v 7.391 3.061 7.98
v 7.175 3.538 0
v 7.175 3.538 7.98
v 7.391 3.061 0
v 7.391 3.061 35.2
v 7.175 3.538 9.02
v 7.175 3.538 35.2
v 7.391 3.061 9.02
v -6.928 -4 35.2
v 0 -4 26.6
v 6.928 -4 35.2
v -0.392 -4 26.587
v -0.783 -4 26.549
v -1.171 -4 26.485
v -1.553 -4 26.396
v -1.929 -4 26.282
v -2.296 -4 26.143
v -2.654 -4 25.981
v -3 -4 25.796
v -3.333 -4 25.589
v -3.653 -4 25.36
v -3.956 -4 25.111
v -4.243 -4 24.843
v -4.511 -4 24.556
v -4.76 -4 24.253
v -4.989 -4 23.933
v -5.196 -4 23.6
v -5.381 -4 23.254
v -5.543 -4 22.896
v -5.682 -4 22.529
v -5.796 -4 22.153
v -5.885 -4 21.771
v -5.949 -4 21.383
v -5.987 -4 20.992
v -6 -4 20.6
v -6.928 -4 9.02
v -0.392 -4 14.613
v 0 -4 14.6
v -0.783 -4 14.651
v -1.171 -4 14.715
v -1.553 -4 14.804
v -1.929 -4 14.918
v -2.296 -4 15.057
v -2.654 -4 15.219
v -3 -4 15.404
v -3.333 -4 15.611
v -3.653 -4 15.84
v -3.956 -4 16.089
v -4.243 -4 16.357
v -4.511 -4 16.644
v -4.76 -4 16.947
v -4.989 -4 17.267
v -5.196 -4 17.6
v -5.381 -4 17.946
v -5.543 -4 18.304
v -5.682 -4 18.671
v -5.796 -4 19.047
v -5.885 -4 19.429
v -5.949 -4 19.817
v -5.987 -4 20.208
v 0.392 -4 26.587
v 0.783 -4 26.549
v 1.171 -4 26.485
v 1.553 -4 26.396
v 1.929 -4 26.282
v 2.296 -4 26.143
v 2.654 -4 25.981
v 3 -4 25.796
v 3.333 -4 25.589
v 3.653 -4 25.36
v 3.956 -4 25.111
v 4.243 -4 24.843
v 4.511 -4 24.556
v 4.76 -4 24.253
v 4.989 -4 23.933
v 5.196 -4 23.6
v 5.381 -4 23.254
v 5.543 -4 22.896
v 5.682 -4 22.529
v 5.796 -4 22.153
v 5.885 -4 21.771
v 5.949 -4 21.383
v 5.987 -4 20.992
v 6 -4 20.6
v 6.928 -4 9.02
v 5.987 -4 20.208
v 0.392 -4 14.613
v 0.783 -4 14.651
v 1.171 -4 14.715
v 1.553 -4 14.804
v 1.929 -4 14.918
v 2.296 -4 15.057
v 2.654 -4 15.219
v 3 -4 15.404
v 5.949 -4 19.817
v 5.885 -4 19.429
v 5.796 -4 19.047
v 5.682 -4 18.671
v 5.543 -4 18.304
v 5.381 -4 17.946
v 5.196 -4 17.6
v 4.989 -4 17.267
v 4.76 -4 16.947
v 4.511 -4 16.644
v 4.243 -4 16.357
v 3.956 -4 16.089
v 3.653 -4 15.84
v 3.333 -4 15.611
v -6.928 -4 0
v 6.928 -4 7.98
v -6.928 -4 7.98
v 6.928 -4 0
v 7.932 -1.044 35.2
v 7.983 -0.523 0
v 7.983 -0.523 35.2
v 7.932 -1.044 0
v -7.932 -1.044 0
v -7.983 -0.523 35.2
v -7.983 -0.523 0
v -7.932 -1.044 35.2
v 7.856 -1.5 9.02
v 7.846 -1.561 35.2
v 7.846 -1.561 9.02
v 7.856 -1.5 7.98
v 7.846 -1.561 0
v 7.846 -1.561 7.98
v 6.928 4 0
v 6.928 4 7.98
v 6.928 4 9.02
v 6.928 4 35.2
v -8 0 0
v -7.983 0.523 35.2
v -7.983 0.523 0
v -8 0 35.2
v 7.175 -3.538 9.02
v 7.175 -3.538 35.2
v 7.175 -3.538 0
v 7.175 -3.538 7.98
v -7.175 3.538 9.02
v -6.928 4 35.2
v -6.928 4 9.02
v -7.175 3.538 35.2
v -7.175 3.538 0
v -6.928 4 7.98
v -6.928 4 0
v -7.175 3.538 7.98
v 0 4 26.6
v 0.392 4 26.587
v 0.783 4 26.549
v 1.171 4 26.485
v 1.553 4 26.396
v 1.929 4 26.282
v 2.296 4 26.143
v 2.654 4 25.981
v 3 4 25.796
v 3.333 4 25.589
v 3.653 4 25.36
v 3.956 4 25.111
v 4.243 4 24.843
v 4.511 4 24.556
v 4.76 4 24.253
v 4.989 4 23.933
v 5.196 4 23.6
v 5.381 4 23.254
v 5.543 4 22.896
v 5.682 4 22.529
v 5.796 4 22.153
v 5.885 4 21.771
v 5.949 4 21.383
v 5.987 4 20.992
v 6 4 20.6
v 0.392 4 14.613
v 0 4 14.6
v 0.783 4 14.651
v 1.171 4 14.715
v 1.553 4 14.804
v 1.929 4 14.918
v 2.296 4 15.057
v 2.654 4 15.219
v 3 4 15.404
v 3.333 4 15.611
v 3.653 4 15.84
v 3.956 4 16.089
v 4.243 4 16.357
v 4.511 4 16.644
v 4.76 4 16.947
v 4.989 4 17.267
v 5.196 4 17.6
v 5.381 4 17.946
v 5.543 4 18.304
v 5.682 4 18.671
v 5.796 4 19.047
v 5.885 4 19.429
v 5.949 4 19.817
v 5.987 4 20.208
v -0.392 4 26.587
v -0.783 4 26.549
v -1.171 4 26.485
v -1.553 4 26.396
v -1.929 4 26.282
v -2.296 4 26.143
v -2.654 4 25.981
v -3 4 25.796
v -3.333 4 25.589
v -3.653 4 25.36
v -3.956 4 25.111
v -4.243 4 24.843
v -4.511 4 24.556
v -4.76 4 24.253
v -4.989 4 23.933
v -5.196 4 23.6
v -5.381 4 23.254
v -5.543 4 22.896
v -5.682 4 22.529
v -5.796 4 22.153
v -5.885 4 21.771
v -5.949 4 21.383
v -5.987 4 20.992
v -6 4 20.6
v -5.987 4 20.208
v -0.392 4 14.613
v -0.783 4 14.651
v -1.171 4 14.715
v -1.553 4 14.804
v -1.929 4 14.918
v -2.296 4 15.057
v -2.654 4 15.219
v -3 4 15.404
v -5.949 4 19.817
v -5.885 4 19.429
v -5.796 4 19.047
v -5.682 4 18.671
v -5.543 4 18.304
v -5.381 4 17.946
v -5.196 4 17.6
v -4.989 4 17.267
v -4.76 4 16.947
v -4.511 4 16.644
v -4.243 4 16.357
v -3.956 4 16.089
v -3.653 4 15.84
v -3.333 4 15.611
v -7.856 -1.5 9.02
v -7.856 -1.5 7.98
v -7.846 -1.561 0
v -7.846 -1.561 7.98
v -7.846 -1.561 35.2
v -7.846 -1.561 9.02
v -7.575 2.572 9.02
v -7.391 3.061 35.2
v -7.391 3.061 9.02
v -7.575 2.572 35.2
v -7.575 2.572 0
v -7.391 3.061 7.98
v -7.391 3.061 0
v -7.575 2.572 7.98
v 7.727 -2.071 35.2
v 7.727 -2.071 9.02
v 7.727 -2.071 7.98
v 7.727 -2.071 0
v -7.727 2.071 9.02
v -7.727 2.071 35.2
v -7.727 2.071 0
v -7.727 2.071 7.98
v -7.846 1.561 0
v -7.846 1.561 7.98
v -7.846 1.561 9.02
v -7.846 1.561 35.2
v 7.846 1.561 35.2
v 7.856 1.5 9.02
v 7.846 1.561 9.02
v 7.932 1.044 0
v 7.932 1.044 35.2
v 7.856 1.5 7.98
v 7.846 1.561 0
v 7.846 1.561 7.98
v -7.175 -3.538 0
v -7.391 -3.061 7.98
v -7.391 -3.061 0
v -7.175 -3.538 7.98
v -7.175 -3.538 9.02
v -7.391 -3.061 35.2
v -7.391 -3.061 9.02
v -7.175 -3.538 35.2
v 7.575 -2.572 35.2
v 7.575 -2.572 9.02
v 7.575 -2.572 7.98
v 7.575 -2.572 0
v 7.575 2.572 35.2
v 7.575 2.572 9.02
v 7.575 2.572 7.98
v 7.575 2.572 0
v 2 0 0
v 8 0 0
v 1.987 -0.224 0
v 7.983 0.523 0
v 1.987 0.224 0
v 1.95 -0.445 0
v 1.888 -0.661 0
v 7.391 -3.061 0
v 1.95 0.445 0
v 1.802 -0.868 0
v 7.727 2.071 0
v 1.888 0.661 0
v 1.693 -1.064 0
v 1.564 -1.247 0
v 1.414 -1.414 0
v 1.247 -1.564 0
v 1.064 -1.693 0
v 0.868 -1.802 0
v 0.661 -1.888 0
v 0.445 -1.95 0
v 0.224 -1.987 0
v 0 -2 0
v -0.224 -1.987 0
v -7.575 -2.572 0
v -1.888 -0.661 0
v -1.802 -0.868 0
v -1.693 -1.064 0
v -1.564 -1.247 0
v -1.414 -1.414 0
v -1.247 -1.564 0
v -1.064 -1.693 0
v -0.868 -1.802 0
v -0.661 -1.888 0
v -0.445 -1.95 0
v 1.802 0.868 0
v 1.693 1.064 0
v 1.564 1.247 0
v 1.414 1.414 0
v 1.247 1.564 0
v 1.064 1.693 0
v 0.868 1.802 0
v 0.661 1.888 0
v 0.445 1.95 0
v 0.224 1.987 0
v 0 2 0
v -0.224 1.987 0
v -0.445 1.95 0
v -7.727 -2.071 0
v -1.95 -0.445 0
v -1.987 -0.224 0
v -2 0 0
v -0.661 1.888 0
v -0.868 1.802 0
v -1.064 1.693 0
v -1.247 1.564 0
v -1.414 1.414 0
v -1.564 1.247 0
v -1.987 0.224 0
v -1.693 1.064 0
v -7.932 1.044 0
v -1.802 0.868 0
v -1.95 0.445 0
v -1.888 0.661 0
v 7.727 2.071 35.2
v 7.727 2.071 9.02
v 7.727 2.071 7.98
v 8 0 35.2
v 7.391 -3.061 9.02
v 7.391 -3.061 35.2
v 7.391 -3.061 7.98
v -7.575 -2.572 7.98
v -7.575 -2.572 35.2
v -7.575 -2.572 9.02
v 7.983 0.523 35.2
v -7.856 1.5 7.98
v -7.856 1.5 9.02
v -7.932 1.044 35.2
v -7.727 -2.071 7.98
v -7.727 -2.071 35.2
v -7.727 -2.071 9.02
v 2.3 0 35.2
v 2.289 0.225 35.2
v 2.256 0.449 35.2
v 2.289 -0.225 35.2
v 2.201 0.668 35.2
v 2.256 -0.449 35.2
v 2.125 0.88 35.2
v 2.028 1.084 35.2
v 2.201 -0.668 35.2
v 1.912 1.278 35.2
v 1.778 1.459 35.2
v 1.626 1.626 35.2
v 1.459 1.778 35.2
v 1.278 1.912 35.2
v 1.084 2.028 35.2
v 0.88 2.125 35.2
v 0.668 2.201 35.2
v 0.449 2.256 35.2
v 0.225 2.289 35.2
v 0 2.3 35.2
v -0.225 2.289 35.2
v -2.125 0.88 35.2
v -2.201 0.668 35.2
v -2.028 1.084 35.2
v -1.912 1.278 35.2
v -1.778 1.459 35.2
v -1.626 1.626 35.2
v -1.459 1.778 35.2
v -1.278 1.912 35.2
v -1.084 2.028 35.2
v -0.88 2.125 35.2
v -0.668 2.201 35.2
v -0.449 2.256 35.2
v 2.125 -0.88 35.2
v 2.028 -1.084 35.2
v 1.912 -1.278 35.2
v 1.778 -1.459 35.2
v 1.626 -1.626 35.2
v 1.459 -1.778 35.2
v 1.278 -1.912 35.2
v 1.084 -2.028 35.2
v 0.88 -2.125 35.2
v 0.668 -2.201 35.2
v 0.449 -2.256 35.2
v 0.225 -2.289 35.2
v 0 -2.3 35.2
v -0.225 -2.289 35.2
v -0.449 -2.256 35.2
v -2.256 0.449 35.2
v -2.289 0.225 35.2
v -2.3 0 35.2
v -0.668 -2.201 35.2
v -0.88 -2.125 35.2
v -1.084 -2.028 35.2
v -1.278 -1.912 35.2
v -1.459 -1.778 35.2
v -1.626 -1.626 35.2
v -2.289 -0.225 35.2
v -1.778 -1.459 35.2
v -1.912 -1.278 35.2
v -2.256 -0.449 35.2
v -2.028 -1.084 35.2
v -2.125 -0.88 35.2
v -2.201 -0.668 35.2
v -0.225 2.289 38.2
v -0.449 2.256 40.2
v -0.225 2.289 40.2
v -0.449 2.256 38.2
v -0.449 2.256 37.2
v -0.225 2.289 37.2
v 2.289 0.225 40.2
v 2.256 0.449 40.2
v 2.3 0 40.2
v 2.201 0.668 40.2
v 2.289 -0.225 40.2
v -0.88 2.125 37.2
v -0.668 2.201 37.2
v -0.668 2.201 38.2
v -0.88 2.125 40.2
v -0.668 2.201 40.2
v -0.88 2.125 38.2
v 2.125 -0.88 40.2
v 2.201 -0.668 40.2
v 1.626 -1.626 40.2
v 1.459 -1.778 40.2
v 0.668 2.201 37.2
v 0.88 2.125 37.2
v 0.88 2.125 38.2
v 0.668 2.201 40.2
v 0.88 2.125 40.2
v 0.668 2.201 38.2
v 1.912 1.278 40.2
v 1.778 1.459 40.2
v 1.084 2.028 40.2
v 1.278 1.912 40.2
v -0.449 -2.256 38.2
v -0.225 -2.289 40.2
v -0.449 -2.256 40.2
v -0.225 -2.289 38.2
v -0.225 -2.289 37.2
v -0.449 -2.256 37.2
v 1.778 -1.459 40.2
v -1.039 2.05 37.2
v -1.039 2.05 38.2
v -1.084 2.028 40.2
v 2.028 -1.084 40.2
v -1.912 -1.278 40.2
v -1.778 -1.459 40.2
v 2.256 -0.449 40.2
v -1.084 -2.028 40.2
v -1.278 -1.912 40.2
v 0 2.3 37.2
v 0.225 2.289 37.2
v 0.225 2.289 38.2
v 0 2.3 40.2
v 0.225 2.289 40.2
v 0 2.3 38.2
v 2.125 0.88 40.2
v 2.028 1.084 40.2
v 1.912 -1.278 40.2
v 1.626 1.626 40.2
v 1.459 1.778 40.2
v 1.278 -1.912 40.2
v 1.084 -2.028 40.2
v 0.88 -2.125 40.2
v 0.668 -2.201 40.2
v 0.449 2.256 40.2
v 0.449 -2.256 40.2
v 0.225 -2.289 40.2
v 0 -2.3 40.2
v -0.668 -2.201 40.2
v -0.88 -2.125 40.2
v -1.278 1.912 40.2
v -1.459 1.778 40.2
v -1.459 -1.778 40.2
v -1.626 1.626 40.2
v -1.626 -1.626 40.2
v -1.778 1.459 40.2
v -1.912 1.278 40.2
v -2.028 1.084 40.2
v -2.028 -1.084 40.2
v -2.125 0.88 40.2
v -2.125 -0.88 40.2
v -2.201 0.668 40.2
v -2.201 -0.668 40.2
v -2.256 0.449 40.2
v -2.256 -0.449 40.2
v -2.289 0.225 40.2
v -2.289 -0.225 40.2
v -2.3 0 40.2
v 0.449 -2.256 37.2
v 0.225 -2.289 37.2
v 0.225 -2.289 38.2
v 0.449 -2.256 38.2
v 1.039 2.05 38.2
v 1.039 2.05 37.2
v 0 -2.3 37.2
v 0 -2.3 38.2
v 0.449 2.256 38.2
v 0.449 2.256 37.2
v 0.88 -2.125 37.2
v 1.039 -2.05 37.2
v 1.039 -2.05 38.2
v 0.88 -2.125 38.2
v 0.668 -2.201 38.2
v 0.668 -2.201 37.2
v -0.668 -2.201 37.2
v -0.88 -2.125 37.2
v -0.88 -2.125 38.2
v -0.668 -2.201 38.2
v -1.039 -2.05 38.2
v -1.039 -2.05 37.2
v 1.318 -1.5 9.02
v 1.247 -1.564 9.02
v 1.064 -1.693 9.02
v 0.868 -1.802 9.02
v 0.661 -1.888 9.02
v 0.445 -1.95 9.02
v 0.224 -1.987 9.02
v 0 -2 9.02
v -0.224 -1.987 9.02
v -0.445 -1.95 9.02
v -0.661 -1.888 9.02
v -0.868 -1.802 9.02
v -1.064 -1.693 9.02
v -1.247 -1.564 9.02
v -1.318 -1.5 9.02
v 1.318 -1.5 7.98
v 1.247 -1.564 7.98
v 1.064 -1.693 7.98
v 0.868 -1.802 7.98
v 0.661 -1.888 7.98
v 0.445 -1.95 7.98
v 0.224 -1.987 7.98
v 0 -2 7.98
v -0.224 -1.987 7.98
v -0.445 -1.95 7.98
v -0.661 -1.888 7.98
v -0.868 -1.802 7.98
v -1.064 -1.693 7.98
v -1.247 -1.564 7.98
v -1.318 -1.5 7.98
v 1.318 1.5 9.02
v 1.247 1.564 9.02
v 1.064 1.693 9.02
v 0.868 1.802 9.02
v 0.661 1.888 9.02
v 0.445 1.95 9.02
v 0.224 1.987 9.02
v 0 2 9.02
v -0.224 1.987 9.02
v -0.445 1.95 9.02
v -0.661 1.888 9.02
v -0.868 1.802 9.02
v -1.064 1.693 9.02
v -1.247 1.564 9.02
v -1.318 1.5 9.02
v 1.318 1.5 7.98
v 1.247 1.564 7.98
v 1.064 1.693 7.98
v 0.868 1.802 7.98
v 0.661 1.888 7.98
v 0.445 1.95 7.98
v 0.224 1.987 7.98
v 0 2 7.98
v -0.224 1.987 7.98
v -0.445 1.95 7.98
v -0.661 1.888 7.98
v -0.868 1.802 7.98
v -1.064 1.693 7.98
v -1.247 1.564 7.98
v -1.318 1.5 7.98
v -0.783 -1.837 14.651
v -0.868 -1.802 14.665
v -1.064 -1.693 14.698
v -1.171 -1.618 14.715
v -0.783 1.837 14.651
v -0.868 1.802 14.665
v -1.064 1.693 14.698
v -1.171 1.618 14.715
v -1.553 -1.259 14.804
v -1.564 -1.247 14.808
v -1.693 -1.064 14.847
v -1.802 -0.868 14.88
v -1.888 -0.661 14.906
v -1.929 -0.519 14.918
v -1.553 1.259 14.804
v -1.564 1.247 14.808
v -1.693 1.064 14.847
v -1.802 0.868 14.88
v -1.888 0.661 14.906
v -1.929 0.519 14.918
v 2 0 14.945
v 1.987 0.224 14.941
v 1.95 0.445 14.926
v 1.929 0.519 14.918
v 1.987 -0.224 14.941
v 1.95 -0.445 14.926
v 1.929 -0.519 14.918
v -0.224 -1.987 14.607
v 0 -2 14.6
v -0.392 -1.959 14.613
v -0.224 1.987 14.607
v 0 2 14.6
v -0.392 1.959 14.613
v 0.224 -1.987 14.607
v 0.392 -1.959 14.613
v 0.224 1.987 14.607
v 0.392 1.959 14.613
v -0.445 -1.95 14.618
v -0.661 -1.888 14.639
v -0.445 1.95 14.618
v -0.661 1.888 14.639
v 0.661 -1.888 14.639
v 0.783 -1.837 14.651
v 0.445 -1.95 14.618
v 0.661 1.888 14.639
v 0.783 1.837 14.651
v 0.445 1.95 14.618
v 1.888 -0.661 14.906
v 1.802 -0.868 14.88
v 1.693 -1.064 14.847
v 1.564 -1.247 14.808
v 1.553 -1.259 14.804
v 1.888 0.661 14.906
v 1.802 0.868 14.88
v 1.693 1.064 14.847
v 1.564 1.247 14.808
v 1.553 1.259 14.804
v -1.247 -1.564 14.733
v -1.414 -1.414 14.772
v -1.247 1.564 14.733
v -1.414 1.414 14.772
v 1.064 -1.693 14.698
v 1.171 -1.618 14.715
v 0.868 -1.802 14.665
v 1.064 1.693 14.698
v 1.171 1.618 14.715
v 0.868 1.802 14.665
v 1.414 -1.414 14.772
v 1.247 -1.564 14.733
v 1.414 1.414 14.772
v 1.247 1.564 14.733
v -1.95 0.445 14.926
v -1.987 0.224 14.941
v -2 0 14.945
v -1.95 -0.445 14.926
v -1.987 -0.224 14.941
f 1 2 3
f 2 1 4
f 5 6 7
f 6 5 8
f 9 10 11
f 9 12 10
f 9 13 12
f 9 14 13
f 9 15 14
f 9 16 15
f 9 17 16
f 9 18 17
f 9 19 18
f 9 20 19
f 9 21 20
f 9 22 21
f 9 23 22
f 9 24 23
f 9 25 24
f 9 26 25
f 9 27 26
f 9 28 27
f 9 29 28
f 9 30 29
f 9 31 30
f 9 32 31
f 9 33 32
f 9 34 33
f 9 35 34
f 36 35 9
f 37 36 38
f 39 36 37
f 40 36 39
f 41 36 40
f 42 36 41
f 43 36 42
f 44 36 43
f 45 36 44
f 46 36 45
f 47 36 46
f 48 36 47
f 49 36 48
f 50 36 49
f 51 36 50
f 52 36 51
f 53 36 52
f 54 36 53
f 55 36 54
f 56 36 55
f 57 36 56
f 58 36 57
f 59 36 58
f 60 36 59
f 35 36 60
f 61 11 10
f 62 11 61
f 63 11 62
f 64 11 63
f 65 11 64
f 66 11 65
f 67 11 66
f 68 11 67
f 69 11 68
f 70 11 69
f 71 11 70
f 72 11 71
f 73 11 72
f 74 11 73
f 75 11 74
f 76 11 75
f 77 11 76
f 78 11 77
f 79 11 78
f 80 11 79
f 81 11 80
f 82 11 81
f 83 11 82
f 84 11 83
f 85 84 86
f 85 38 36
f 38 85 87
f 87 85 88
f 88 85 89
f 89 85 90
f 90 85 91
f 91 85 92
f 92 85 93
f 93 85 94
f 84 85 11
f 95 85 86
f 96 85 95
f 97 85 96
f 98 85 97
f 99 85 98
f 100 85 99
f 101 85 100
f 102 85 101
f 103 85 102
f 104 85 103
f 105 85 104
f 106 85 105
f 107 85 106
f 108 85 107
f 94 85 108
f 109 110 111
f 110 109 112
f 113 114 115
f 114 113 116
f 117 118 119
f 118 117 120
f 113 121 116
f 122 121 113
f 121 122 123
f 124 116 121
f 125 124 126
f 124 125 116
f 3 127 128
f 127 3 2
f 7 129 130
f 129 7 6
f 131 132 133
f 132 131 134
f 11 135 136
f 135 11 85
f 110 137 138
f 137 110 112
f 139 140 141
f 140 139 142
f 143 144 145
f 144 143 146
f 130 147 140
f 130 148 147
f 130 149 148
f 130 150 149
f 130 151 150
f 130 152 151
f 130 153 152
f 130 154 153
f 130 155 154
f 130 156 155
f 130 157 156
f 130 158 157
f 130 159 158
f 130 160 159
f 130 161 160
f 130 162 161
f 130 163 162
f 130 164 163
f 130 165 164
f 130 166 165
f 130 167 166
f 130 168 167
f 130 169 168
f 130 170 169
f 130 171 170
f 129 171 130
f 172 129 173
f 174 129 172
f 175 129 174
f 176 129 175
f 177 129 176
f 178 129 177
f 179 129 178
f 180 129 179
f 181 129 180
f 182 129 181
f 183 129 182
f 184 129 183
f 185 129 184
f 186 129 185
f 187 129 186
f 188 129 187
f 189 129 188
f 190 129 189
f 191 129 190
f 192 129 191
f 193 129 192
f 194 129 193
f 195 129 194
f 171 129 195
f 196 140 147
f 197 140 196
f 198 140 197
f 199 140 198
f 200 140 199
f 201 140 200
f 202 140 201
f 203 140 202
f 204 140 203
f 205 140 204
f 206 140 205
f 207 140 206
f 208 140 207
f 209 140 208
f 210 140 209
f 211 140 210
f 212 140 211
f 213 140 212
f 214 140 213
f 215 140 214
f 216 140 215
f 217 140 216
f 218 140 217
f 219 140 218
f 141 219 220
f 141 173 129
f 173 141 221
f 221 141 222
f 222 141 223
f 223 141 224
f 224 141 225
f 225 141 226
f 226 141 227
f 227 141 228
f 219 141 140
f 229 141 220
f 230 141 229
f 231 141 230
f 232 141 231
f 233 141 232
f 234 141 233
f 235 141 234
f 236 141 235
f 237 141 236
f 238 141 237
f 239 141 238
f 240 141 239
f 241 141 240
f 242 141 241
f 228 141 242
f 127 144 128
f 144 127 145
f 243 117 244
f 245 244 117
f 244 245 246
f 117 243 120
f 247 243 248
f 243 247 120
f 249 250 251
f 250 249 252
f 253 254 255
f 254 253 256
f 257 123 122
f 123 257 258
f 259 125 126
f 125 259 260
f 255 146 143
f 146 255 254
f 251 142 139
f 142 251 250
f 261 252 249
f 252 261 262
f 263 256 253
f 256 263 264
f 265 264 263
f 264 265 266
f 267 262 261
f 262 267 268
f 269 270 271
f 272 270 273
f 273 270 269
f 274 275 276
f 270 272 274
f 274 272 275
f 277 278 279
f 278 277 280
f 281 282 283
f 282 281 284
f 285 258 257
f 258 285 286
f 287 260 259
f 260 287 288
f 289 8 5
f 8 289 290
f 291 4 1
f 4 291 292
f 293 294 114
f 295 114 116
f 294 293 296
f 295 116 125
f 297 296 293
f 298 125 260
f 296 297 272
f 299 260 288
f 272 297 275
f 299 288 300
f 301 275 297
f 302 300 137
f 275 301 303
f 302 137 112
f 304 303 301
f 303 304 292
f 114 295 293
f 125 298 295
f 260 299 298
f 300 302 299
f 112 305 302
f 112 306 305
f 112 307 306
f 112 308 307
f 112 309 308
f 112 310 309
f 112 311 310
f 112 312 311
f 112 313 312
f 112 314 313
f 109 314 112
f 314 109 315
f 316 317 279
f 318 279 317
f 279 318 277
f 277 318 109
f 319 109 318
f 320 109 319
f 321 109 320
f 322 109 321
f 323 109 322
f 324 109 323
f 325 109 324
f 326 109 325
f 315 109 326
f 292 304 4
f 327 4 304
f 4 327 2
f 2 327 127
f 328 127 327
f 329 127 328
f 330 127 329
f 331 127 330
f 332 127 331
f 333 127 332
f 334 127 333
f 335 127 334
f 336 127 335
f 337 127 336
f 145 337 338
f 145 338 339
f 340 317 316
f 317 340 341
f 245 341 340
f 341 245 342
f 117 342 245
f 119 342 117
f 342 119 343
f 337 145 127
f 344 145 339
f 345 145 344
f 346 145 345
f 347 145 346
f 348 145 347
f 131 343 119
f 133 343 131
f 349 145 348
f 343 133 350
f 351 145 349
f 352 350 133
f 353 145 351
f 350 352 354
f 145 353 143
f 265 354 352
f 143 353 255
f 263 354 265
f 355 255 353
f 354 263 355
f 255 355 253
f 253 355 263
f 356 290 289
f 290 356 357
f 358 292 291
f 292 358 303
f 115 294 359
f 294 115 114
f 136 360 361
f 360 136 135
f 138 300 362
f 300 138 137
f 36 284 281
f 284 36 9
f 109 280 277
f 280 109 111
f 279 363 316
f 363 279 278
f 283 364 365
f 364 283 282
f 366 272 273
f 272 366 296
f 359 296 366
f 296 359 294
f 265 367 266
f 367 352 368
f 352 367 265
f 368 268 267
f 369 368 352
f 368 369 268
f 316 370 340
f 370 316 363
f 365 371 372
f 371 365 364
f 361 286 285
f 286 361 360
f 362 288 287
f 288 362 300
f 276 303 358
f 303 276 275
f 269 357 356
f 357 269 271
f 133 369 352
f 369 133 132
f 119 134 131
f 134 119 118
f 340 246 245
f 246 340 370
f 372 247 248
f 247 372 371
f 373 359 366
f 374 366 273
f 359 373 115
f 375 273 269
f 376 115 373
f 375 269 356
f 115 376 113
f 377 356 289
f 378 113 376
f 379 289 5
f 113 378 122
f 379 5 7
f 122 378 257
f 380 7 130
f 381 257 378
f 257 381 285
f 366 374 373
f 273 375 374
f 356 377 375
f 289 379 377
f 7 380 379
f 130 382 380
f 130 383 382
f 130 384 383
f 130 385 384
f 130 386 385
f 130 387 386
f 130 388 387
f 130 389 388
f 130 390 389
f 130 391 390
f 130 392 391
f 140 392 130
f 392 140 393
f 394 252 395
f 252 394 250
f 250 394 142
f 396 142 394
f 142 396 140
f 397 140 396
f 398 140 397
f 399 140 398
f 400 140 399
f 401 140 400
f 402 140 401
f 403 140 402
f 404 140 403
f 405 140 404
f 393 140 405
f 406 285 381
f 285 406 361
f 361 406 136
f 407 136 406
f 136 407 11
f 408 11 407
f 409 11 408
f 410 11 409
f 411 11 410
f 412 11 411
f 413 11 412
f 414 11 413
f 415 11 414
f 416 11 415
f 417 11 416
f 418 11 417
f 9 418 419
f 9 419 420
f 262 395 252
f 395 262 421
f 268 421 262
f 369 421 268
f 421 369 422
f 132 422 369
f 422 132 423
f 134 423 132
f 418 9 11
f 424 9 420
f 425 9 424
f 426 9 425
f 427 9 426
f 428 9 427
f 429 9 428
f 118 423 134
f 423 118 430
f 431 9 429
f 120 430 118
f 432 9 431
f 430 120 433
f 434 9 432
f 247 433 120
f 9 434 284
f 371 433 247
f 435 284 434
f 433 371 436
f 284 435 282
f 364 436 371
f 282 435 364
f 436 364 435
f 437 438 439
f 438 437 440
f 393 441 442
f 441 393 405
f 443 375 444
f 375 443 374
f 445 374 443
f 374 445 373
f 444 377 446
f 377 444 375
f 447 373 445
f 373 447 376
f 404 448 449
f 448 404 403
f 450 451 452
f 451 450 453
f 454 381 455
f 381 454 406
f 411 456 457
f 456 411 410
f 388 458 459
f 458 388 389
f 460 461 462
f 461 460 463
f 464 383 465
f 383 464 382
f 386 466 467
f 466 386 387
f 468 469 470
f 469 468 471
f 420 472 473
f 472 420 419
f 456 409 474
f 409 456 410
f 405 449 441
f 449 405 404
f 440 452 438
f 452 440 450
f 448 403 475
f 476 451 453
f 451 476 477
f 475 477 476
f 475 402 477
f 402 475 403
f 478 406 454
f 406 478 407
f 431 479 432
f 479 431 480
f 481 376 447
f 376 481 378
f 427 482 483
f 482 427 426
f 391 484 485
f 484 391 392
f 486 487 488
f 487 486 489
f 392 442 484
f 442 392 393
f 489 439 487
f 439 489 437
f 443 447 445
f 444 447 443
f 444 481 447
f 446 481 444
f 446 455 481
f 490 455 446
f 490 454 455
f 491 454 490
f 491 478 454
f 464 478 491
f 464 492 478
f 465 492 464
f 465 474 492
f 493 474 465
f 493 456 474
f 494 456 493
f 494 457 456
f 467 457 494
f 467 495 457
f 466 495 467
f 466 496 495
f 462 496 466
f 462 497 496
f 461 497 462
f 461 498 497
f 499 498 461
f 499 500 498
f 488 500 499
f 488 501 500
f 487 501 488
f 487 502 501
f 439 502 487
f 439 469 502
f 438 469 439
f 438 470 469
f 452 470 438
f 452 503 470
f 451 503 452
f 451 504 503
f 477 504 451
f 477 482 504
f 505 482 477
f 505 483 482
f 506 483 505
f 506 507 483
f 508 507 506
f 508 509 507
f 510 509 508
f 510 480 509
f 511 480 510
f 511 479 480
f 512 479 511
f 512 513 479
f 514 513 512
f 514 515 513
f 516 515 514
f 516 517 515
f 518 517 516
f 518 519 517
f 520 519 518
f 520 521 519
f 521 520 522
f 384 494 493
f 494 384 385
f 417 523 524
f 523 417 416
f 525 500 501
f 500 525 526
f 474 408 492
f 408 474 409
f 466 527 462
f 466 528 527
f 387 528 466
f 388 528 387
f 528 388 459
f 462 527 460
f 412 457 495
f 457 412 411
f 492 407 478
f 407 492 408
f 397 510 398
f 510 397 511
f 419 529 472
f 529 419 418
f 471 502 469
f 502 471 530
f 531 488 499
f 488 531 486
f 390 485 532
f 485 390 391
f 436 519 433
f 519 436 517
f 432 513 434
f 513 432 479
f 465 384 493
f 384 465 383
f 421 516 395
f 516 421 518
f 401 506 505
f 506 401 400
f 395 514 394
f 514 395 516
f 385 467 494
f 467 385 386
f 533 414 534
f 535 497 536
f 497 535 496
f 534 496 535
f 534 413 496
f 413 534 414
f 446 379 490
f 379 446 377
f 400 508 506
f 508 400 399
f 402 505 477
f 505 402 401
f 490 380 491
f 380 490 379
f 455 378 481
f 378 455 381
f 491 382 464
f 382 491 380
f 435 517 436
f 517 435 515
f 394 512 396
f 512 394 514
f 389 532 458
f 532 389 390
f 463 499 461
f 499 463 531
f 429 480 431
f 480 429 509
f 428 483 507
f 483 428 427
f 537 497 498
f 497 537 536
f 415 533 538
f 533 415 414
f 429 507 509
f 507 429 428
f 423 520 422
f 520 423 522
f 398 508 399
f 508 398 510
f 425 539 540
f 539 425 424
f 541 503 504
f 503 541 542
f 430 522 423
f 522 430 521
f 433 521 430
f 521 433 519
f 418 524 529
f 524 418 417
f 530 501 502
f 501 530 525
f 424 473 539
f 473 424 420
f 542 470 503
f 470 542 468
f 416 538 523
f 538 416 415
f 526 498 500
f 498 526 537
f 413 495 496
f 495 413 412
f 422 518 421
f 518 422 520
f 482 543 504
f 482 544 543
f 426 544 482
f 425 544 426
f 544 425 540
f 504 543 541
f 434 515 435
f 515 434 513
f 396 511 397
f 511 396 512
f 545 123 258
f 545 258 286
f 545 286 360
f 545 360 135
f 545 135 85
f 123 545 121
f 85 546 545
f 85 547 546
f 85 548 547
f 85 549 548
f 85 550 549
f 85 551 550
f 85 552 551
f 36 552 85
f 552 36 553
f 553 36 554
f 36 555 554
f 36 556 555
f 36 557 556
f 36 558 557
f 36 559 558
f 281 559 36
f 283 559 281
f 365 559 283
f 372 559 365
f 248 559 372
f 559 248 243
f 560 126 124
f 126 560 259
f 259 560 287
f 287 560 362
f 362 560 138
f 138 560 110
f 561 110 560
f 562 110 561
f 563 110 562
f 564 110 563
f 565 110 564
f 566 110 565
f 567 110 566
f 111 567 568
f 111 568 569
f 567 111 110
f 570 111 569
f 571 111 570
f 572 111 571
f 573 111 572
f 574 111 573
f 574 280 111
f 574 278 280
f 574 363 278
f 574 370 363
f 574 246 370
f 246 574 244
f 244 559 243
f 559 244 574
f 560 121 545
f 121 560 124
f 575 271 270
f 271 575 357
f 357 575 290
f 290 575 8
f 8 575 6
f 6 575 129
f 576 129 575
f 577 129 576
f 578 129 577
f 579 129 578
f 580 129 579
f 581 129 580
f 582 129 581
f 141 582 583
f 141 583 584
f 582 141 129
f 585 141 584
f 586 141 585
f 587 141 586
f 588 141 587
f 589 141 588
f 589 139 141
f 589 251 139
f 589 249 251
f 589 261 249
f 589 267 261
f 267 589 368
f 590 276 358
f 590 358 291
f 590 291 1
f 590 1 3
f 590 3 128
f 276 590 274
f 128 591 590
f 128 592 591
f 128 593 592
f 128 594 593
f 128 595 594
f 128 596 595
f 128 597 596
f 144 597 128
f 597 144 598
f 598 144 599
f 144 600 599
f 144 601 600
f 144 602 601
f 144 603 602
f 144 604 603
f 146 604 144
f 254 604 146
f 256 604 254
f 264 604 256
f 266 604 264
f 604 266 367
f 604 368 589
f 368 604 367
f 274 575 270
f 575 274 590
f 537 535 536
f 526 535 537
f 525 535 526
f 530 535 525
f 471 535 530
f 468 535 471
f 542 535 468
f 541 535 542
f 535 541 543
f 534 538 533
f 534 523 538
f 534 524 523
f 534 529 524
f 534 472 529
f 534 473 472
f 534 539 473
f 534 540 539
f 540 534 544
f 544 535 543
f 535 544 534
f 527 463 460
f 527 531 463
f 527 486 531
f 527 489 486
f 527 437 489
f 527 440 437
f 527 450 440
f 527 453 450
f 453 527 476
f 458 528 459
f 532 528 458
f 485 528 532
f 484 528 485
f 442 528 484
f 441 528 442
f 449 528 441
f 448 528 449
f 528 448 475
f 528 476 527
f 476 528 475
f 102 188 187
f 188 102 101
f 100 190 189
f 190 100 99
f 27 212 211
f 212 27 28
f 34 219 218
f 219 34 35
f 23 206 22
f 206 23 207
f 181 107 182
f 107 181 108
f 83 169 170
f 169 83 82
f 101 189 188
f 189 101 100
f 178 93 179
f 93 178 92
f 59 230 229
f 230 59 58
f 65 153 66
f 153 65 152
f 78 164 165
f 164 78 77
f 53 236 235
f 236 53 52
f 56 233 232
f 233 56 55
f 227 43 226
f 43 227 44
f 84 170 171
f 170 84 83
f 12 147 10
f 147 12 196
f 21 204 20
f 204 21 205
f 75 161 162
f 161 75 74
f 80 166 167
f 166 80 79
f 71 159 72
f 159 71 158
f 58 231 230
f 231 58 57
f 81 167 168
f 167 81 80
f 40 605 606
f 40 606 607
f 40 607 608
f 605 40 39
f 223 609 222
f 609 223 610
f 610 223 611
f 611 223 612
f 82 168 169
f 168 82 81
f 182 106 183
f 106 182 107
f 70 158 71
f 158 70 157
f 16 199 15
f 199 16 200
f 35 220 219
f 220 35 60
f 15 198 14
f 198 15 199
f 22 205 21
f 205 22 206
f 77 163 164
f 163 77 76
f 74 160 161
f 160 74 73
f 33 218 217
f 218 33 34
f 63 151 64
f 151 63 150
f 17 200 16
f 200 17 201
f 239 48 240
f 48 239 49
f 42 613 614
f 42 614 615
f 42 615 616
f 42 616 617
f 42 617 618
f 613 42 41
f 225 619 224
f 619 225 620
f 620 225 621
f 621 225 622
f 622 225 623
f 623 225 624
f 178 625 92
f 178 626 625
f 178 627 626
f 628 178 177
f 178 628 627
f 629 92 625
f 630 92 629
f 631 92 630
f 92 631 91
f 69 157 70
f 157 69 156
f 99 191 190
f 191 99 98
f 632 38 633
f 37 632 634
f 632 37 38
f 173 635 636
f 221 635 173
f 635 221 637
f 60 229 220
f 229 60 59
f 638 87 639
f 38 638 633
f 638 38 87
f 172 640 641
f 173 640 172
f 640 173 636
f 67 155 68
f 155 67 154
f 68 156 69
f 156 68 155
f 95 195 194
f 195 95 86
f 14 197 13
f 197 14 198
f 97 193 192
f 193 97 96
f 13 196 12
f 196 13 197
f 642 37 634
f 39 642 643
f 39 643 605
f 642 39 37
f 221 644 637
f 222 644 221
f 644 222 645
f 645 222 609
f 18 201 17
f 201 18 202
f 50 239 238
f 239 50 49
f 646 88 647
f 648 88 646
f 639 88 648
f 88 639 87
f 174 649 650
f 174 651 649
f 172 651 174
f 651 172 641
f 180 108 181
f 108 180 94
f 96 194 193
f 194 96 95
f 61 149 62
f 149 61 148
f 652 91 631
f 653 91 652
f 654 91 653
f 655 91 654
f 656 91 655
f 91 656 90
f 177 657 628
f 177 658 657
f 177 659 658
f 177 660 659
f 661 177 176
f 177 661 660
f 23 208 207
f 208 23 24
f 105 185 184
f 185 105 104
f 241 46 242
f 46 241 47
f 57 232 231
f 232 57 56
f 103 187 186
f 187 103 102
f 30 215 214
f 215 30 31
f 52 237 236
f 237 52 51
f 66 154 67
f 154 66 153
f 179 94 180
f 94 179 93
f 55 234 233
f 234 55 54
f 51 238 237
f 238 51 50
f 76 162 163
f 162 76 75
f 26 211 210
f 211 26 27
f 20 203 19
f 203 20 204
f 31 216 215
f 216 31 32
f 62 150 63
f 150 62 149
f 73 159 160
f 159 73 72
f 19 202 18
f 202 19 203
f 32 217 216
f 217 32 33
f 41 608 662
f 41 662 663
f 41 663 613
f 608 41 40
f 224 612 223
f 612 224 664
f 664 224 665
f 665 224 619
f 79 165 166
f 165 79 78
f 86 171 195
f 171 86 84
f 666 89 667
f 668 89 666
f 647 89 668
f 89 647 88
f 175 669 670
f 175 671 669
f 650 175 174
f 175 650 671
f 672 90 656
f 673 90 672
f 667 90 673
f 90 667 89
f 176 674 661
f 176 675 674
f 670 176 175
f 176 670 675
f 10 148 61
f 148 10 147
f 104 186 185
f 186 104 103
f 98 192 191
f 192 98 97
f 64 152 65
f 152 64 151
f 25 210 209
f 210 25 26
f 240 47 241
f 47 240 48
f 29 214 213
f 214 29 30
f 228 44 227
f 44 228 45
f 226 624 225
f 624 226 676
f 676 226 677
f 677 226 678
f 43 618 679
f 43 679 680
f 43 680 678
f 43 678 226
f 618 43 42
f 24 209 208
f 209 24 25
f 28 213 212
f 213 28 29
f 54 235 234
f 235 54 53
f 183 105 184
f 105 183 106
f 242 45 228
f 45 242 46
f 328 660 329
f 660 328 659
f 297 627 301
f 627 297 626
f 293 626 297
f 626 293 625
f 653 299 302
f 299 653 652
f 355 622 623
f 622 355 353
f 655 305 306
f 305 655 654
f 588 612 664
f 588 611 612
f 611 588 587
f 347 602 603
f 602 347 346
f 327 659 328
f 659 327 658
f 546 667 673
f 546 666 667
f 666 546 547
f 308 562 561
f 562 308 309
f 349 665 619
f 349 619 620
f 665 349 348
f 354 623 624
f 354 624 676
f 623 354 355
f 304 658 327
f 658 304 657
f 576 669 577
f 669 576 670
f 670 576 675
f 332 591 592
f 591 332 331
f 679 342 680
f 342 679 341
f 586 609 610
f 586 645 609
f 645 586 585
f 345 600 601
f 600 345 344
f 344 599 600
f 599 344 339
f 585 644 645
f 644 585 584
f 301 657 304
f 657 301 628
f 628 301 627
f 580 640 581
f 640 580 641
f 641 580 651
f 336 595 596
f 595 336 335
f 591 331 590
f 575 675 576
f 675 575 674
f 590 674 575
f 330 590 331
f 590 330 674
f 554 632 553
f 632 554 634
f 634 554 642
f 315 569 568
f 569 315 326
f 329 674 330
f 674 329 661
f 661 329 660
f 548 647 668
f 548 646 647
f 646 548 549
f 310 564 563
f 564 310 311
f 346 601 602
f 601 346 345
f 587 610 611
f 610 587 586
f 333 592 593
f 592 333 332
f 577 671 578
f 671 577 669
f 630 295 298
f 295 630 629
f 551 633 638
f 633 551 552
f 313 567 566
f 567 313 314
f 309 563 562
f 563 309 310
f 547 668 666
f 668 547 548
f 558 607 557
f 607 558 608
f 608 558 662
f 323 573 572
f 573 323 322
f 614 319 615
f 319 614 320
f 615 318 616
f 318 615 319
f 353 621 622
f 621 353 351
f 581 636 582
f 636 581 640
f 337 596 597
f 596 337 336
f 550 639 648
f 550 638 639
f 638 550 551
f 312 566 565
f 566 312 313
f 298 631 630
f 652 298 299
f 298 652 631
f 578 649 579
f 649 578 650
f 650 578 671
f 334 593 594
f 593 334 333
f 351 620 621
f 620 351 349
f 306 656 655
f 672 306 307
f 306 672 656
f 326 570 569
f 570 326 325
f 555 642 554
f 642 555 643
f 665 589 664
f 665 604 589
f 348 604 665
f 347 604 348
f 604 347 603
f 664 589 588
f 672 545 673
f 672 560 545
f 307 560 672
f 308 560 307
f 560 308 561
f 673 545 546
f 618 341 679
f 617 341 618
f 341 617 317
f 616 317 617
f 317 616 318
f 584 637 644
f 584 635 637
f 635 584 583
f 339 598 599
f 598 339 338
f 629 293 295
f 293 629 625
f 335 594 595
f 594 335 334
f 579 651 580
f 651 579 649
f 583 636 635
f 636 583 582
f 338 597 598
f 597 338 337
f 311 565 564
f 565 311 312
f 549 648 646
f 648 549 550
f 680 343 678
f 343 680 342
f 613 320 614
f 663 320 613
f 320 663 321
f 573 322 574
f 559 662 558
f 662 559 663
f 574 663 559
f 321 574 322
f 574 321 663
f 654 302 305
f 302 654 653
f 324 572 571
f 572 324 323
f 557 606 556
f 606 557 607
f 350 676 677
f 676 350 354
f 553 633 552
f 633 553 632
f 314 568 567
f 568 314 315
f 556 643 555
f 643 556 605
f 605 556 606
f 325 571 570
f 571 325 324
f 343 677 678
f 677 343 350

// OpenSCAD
// part_id: a7
// name: A7 block
// source_drawing_ids: DRW-001
// units: mm
// revision: 0.2
// SPDX-License-Identifier: MIT

module a7_body_2d(base_r = 8.0, trim_half = 4.0) {
    // Drawing-driven base profile:
    // start from R8 circle, trim with parallel cuts at y = +/-4.
    intersection() {
        circle(r = base_r, $fn = 96);
        square([2 * base_r, 2 * trim_half], center = true);
    }
}

module part_a7(
    w = 16.0,
    d = 8.0,
    body_h = 35.2,
    bore_d = 12.0,
    bore_center_z = 20.6,
    // Bottom blind vertical hole (diameter inferred from drawing).
    bottom_hole_d = 4.0,
    // Top feature: simple column (slot details deferred).
    top_post_d = 4.6,
    top_post_h = 5.0,
    top_post_slot_h = 1.0,
    top_post_slot_depth = 0.25,
    // Body groove around lower portion.
    groove_z = 8.0,
    groove_h = 1.0,
    groove_depth_wide = 2.5,
    base_r = 8.0,
    trim_half = 4.0
) {
    difference() {
        union() {
            // Main block.
            linear_extrude(height = body_h)
                a7_body_2d(base_r = base_r, trim_half = trim_half);

            // Simple top column.
            translate([0, 0, body_h])
                cylinder(d = top_post_d, h = top_post_h, center = false, $fn = 64);
        }

        // Main transverse bore (Ø12), dimension-driven location.
        translate([0, 0, bore_center_z])
            rotate([90, 0, 0])
                cylinder(d = bore_d, h = d + 0.4, center = true, $fn = 96);

        // Bottom blind vertical hole up to side-bore centerline.
        translate([0, 0, -0.1])
            cylinder(d = bottom_hole_d, h = bore_center_z + 0.2, center = false, $fn = 56);

        // Side grooves only on the two wide faces (deeper), not wrapping around short ends.
        for (sy = [-1, 1])
            translate([0, sy * (trim_half - groove_depth_wide / 2), groove_z + groove_h / 2])
                cube([2 * (base_r + 0.4), groove_depth_wide, groove_h + 0.04], center = true);

        // Matching slot pair in the middle of the upper pin.
        // Opposing shallow cuts, centered at pin mid-height.
        for (sy = [-1, 1])
            translate([
                0,
                sy * (top_post_d / 2 - top_post_slot_depth / 2),
                body_h + top_post_h / 2
            ])
                cube([top_post_d + 0.4, top_post_slot_depth, top_post_slot_h], center = true);

    }
}


// ---- "main guard" ----
// Default to previewing when opened directly:
if (is_undef(__LIB_MODE__)) {
    part_a7();
}
